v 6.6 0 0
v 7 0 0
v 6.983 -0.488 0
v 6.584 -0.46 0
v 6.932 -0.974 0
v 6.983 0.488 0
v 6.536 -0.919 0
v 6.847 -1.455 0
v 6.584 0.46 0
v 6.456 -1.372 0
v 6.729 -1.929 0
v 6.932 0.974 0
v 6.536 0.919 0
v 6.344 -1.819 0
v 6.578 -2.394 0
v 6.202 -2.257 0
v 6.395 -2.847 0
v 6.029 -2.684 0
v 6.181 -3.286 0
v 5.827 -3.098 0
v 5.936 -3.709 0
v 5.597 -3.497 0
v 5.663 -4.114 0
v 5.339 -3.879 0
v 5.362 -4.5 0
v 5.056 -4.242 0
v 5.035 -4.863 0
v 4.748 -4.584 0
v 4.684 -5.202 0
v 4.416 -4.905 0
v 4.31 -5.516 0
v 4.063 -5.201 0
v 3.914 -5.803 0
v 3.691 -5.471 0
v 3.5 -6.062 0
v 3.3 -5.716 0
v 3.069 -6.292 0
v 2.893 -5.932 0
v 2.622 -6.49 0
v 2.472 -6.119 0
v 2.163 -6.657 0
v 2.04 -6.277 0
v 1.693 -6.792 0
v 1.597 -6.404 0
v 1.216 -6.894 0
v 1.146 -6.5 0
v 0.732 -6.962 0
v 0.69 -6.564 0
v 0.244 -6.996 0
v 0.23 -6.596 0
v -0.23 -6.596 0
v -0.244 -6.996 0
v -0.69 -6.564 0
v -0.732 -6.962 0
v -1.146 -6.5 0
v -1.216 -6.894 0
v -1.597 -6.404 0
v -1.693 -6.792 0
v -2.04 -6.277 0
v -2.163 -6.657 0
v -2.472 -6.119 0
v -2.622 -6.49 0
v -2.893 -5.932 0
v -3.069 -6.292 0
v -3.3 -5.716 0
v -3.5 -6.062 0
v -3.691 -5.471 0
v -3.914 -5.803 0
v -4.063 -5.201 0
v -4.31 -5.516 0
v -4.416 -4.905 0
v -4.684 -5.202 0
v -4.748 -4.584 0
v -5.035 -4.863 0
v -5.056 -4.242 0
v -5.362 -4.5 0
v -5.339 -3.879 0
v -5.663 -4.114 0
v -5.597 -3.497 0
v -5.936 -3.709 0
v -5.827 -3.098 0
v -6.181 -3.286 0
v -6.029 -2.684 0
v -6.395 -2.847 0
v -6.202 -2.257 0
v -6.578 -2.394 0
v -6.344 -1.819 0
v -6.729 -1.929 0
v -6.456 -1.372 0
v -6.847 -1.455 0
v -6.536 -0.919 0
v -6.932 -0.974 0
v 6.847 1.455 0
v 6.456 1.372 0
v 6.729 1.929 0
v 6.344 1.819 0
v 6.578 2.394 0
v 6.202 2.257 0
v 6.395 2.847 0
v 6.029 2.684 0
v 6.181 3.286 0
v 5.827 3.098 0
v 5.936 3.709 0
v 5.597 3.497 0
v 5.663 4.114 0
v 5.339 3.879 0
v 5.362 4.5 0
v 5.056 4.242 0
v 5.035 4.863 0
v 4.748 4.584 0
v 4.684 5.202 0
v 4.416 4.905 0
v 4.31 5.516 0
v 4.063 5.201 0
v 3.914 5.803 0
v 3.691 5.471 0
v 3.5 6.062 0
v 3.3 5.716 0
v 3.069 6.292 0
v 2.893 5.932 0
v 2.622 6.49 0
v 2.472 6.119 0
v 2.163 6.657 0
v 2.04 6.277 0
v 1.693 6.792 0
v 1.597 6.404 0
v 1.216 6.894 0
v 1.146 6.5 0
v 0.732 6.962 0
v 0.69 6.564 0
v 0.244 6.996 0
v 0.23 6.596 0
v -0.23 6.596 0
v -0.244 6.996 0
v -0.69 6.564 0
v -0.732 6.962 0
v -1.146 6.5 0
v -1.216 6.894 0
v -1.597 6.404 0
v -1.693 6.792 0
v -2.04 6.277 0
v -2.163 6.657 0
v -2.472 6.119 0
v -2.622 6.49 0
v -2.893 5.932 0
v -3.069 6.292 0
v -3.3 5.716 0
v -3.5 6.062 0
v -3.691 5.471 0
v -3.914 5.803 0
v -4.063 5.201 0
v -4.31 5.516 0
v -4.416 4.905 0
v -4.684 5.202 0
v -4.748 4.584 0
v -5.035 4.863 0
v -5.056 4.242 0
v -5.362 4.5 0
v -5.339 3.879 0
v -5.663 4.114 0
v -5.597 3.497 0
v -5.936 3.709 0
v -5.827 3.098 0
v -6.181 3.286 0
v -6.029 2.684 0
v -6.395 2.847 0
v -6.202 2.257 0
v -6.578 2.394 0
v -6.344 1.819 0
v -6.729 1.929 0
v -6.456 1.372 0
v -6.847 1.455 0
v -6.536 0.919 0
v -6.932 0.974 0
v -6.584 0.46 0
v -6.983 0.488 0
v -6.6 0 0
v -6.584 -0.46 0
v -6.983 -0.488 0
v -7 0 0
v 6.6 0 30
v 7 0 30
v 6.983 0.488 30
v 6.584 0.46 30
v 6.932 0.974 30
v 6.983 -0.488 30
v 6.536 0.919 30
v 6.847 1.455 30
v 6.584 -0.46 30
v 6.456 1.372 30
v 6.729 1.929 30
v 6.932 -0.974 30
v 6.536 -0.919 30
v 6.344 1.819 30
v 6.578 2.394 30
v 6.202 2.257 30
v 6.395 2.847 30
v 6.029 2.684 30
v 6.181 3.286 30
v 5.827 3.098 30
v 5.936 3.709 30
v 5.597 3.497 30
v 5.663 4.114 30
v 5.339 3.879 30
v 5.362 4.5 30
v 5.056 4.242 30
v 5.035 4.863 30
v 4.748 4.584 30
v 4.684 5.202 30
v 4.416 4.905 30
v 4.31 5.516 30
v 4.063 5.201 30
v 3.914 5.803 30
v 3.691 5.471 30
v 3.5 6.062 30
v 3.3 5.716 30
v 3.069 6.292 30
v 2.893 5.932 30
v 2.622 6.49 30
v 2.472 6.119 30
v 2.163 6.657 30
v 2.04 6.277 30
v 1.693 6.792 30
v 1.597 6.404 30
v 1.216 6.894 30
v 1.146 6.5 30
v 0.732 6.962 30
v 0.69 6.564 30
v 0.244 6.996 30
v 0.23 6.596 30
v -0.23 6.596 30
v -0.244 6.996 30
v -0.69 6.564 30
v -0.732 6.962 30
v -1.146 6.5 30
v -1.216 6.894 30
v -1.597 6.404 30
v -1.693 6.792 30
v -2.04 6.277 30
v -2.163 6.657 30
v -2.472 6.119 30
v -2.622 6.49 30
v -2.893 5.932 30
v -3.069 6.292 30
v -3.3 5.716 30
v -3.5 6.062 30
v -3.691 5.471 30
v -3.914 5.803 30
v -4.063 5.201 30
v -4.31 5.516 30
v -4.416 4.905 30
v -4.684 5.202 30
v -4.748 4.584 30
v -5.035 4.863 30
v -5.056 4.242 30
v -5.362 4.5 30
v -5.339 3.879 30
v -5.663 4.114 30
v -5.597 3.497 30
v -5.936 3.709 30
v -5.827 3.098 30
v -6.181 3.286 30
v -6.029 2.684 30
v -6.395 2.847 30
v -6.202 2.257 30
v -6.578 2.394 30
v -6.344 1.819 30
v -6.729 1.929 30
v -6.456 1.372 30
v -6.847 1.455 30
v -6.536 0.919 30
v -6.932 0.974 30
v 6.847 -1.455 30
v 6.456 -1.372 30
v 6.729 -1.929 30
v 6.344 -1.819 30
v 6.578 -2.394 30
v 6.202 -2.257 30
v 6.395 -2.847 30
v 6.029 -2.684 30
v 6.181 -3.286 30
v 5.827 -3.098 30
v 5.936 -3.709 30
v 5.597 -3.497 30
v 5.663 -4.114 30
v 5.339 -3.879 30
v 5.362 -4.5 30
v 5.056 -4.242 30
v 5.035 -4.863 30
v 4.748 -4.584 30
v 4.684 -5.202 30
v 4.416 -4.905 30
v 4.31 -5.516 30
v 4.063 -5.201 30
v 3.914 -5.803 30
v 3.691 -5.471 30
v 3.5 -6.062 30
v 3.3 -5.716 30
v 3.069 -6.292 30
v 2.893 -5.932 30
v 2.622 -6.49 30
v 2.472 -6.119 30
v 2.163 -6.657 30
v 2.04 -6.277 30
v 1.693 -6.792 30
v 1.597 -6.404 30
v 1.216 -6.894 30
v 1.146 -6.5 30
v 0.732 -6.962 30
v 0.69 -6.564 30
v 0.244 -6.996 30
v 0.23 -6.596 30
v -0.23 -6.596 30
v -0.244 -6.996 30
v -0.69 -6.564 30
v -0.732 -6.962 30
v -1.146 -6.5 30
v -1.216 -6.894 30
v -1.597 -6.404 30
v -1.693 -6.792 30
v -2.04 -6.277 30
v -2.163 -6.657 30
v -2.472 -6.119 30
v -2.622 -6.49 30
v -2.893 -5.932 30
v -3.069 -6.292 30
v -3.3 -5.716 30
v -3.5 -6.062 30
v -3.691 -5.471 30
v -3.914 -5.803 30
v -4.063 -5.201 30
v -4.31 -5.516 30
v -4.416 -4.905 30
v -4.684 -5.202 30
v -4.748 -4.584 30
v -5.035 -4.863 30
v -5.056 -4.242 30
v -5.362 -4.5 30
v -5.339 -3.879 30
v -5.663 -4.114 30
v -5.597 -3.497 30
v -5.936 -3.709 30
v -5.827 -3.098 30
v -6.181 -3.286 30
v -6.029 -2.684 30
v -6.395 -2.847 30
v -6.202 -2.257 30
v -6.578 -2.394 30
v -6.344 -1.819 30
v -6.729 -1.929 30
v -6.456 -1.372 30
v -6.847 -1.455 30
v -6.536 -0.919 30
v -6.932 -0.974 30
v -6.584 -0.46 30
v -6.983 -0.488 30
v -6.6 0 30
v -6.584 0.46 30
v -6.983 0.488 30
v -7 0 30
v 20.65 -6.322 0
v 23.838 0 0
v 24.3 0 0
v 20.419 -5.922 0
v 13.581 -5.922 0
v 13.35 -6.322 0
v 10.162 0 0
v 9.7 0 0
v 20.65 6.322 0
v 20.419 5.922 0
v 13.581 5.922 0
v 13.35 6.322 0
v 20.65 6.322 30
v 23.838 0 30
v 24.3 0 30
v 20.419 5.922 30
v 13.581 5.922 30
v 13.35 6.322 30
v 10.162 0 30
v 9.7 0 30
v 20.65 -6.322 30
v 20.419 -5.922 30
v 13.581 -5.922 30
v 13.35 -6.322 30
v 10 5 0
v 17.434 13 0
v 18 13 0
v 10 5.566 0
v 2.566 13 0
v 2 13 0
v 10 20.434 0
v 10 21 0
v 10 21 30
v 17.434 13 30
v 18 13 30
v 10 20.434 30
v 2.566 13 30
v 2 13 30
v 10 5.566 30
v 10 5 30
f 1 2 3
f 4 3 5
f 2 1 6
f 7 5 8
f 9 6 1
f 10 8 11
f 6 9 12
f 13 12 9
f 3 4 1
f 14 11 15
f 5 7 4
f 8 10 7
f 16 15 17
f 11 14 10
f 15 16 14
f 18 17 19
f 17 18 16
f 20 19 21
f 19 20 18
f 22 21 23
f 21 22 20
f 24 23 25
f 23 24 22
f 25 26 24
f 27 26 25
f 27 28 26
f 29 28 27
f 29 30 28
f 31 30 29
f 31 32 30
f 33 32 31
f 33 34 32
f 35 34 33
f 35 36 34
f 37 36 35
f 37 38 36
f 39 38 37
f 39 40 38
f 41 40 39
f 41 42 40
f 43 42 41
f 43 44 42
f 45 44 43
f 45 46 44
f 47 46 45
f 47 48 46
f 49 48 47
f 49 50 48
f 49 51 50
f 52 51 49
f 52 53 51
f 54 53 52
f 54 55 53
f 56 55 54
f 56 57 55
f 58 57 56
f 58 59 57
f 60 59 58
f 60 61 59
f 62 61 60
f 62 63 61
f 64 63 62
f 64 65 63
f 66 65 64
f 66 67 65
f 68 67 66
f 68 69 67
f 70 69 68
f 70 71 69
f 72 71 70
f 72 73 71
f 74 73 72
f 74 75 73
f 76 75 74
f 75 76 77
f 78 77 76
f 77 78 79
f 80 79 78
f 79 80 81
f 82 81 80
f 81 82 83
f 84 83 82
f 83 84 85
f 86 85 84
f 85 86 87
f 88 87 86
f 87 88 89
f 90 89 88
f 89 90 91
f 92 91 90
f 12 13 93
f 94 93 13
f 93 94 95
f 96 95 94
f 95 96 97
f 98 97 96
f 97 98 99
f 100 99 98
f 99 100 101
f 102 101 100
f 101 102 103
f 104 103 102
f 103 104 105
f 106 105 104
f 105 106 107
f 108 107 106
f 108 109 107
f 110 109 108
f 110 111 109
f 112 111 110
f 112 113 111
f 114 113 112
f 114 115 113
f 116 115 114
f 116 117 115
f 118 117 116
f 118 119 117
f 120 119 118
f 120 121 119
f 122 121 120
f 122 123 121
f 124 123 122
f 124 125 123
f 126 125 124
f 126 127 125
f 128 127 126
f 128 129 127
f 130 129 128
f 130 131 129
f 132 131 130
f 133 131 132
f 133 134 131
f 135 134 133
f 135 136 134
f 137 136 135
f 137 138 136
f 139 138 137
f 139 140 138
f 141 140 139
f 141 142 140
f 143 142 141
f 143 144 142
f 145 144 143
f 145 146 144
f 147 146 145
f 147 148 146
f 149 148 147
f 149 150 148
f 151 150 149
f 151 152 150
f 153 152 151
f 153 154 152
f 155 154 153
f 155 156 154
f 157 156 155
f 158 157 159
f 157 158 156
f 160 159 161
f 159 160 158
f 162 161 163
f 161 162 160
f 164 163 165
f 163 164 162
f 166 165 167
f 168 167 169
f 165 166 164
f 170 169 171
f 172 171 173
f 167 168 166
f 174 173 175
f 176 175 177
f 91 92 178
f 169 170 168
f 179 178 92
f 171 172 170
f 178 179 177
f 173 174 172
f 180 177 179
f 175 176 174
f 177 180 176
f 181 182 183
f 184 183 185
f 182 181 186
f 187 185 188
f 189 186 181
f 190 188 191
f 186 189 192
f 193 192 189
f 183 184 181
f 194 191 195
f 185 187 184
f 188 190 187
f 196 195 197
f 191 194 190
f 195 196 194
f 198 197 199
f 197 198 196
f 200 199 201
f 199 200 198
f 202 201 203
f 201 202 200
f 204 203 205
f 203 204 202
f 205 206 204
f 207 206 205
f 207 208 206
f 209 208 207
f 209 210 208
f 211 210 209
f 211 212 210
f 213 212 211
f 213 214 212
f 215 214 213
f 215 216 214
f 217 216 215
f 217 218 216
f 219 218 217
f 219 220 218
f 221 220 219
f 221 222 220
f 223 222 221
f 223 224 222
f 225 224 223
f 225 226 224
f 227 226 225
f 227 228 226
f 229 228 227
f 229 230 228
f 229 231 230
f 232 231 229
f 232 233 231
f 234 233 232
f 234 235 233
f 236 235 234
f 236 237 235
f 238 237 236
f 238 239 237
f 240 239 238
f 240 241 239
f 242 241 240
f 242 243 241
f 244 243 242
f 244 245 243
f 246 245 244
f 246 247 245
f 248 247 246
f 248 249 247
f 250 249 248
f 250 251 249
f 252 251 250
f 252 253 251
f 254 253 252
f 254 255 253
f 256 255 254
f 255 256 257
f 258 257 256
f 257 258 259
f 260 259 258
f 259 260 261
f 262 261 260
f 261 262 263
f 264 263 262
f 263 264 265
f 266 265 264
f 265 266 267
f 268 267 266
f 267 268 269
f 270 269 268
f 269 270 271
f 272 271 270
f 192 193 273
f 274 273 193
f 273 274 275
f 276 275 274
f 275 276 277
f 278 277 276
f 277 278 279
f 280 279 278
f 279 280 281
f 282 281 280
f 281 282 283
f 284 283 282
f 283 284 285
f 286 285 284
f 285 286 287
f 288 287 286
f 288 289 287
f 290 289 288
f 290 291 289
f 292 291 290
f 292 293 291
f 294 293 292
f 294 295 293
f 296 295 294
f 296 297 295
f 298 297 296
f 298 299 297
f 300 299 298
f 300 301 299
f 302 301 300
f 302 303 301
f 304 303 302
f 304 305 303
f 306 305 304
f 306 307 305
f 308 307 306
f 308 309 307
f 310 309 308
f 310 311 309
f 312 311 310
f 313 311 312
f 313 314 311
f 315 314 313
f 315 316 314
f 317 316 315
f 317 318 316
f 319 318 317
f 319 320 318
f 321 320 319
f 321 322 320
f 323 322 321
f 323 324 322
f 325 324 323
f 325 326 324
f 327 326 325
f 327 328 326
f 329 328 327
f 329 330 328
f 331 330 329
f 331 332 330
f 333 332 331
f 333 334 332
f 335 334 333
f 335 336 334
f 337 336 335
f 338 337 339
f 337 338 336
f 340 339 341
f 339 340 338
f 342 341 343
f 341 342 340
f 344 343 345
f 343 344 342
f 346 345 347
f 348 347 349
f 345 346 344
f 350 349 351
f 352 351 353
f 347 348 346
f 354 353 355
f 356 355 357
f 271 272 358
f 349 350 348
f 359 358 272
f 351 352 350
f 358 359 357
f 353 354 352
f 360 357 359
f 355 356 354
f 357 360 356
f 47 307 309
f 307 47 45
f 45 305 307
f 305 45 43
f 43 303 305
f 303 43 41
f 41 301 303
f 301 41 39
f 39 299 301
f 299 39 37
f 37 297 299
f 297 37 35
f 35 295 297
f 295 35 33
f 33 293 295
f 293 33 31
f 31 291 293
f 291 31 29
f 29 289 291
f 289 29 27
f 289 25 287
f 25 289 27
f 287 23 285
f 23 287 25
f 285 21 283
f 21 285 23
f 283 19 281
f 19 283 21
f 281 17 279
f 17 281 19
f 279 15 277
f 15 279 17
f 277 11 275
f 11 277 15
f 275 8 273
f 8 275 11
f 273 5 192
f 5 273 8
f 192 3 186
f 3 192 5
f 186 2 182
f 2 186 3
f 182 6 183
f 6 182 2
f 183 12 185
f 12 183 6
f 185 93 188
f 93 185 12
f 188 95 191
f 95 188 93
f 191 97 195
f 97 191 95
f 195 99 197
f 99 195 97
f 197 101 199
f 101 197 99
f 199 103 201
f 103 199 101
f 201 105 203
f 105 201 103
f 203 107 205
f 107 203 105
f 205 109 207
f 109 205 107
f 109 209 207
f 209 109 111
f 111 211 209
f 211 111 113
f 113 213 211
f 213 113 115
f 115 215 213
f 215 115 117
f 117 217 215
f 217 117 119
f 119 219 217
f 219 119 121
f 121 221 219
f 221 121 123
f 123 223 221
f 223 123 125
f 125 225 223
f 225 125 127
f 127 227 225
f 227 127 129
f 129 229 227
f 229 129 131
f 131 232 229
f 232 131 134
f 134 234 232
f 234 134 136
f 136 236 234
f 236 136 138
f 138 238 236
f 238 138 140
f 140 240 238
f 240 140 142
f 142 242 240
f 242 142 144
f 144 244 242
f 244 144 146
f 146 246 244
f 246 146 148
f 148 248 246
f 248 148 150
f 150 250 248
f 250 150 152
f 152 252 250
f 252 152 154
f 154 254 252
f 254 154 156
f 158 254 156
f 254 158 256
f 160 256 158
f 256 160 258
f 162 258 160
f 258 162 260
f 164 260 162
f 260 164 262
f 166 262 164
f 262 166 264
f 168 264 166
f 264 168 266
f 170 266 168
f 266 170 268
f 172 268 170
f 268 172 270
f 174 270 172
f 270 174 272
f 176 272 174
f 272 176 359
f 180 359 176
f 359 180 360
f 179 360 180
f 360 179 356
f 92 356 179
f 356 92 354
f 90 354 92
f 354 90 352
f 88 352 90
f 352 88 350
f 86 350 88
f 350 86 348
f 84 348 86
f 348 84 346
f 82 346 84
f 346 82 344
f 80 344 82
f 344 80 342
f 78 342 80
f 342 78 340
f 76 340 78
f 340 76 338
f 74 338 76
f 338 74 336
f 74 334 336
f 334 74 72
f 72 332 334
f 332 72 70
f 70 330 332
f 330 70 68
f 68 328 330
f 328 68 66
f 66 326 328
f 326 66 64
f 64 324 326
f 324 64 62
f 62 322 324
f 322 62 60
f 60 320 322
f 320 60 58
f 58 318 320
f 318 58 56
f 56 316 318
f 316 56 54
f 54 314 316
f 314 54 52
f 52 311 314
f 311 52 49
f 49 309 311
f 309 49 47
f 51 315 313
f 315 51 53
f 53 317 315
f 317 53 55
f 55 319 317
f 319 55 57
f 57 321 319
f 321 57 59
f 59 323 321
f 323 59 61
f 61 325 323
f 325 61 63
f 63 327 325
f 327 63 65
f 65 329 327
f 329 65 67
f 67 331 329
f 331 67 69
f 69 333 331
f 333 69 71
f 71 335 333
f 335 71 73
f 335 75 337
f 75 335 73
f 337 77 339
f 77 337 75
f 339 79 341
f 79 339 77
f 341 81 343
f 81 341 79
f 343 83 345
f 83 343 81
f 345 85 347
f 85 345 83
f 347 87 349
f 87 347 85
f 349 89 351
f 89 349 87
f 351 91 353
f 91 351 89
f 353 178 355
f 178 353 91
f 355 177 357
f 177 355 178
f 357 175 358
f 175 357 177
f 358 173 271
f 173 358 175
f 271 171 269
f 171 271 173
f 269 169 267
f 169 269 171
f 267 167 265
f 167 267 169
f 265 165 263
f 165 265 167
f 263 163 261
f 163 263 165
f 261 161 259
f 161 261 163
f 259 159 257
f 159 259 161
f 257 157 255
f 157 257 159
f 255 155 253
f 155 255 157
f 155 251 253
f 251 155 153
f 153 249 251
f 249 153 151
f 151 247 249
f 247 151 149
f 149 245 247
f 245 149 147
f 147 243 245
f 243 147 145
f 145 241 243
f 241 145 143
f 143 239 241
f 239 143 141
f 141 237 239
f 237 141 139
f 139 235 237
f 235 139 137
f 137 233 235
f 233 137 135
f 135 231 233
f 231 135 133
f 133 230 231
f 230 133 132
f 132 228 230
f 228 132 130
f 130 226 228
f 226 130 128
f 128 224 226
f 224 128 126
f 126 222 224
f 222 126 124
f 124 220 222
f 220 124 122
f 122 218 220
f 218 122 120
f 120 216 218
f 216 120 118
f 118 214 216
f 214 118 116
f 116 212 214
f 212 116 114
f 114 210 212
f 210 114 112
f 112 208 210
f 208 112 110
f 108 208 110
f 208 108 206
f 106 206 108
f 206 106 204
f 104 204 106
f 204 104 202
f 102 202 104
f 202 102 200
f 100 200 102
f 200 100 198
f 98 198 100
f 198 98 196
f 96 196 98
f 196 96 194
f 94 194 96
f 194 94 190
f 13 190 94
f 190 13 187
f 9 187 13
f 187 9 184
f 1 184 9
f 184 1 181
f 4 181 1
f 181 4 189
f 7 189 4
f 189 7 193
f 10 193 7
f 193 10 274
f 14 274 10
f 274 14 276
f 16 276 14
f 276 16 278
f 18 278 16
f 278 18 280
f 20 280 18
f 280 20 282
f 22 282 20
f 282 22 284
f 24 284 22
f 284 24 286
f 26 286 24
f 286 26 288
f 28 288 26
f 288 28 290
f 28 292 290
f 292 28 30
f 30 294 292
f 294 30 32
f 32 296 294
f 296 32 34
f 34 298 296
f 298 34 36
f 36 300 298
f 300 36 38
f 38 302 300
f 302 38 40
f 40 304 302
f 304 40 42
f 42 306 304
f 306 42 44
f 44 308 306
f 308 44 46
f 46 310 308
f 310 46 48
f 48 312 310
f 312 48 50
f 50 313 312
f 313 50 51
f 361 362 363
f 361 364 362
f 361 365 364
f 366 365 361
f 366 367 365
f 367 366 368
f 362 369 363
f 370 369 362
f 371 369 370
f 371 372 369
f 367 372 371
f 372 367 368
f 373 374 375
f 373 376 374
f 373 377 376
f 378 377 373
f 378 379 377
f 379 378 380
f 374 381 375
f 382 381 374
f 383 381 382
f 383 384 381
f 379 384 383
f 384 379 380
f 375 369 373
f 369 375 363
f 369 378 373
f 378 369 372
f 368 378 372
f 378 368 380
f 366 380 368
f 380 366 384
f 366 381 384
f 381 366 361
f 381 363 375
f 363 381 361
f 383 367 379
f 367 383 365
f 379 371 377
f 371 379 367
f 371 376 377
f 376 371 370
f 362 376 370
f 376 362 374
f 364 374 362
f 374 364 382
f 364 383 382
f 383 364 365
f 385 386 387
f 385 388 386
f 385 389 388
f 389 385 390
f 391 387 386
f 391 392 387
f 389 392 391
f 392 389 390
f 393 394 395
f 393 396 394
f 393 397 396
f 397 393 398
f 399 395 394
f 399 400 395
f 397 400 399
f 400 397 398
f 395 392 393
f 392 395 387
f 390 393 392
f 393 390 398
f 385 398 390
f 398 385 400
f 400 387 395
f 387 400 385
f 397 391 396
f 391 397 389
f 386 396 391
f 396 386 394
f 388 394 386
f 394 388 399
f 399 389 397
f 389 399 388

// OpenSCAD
length = 30;
wall = 0.4;
$fn = 90;

module straw() {
  linear_extrude(length) {
    difference() {
      children();
      offset(-wall) children();
    }
  }
}

module heart_top() {
  for (a = [-1, 1])
    scale([a, 1])
      translate([2.1, 0]) circle(d=5);
}

module heart() {
  scale([1, 1] * 0.9) {
    heart_top();
    hull() {
      intersection() {
        heart_top();
        translate([0, -50]) square(100, center=true);
      }
      translate([0, -5.4]) square(0.00001);
    }
  }
}

straw() circle(d=7*2);
translate([17, 0, 0]) straw() circle(d=7.3*2, $fn=6);
translate([10, 13, 0]) straw() circle(d=8*2, $fn=4);
